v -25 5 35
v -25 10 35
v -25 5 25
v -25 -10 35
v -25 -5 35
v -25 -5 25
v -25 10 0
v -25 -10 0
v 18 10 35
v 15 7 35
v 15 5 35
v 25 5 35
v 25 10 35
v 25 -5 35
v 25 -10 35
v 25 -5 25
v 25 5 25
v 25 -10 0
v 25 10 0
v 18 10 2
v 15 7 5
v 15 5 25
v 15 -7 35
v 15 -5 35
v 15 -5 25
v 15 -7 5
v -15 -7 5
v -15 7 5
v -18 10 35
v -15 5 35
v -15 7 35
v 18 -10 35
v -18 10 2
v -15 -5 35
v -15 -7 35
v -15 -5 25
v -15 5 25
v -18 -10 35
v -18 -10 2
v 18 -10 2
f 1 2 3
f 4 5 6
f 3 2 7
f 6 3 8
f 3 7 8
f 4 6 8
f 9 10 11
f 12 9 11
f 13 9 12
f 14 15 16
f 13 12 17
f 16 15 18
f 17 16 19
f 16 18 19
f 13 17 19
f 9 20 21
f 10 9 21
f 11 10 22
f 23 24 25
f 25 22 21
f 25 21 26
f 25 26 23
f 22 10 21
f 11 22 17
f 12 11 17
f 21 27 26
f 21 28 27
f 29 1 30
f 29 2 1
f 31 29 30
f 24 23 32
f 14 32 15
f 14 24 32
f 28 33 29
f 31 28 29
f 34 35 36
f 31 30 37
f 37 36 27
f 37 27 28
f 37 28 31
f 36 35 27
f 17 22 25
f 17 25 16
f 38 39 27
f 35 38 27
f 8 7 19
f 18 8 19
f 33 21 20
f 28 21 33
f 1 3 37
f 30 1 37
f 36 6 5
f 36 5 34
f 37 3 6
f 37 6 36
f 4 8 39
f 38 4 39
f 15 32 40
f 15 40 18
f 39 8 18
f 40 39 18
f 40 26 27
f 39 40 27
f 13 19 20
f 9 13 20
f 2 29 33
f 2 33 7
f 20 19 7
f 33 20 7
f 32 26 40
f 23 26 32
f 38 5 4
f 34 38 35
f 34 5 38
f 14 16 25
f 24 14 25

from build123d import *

# Parameters (mm, degrees)
F0_W     = 50
F0_H     = 20
F1_DEPTH = 5
F2_W     = 10
F2_H     = 20
F3_DEPTH = 20
F4_SIZE  = 3
F5_W     = 10
F5_H     = 2
F6_DEPTH = 10
F8_DEPTH = 10
F9_SIZE  = 3


with BuildPart() as f1:
    # F0 (on Top) → F1 (new body)
    with BuildSketch(Plane.XY):
        Rectangle(F0_W, F0_H)
    extrude(amount=F1_DEPTH)

    # F2 (on face) → F3 (join)
    with BuildSketch(Plane.XY.offset(5)):
        with Locations((-20, 0)):
            Rectangle(F2_W, F2_H)
        with Locations((20, 0)):
            Rectangle(F2_W, F2_H)
    extrude(amount=F3_DEPTH)

    # F4
    f4_edges = [f1.edges().sort_by_distance(p)[0] for p in [
        (-15, -10, 15),
        (-15, 10, 15),
        (15, 10, 15),
        (15, -10, 15),
    ]]
    chamfer(f4_edges, length=F4_SIZE)

    # F5 (on face) → F6 (join)
    with BuildSketch(Plane.XY.offset(25)):
        Polygon((-25, -10), (-18, -10), (-15, -7), (-25, -7), align=None)
        with Locations((-20, -6)):
            Rectangle(F5_W, F5_H)
        with Locations((-20, 6)):
            Rectangle(F5_W, F5_H)
        Polygon((-25, 7), (-15, 7), (-18, 10), (-25, 10), align=None)
    extrude(amount=F6_DEPTH)

    # F7 (on face) → F8 (join)
    with BuildSketch(Plane.XY.offset(25)):
        Polygon((25, 10), (18, 10), (15, 7), (15, 5), (25, 5), align=None)
        Polygon((25, -5), (15, -5), (15, -7), (18, -10), (25, -10), align=None)
    extrude(amount=F8_DEPTH)

    # F9
    f9_edges = [f1.edges().sort_by_distance(p)[0] for p in [
        (0, -10, 5),
        (0, 10, 5),
    ]]
    chamfer(f9_edges, length=F9_SIZE)


solid = f1.part
